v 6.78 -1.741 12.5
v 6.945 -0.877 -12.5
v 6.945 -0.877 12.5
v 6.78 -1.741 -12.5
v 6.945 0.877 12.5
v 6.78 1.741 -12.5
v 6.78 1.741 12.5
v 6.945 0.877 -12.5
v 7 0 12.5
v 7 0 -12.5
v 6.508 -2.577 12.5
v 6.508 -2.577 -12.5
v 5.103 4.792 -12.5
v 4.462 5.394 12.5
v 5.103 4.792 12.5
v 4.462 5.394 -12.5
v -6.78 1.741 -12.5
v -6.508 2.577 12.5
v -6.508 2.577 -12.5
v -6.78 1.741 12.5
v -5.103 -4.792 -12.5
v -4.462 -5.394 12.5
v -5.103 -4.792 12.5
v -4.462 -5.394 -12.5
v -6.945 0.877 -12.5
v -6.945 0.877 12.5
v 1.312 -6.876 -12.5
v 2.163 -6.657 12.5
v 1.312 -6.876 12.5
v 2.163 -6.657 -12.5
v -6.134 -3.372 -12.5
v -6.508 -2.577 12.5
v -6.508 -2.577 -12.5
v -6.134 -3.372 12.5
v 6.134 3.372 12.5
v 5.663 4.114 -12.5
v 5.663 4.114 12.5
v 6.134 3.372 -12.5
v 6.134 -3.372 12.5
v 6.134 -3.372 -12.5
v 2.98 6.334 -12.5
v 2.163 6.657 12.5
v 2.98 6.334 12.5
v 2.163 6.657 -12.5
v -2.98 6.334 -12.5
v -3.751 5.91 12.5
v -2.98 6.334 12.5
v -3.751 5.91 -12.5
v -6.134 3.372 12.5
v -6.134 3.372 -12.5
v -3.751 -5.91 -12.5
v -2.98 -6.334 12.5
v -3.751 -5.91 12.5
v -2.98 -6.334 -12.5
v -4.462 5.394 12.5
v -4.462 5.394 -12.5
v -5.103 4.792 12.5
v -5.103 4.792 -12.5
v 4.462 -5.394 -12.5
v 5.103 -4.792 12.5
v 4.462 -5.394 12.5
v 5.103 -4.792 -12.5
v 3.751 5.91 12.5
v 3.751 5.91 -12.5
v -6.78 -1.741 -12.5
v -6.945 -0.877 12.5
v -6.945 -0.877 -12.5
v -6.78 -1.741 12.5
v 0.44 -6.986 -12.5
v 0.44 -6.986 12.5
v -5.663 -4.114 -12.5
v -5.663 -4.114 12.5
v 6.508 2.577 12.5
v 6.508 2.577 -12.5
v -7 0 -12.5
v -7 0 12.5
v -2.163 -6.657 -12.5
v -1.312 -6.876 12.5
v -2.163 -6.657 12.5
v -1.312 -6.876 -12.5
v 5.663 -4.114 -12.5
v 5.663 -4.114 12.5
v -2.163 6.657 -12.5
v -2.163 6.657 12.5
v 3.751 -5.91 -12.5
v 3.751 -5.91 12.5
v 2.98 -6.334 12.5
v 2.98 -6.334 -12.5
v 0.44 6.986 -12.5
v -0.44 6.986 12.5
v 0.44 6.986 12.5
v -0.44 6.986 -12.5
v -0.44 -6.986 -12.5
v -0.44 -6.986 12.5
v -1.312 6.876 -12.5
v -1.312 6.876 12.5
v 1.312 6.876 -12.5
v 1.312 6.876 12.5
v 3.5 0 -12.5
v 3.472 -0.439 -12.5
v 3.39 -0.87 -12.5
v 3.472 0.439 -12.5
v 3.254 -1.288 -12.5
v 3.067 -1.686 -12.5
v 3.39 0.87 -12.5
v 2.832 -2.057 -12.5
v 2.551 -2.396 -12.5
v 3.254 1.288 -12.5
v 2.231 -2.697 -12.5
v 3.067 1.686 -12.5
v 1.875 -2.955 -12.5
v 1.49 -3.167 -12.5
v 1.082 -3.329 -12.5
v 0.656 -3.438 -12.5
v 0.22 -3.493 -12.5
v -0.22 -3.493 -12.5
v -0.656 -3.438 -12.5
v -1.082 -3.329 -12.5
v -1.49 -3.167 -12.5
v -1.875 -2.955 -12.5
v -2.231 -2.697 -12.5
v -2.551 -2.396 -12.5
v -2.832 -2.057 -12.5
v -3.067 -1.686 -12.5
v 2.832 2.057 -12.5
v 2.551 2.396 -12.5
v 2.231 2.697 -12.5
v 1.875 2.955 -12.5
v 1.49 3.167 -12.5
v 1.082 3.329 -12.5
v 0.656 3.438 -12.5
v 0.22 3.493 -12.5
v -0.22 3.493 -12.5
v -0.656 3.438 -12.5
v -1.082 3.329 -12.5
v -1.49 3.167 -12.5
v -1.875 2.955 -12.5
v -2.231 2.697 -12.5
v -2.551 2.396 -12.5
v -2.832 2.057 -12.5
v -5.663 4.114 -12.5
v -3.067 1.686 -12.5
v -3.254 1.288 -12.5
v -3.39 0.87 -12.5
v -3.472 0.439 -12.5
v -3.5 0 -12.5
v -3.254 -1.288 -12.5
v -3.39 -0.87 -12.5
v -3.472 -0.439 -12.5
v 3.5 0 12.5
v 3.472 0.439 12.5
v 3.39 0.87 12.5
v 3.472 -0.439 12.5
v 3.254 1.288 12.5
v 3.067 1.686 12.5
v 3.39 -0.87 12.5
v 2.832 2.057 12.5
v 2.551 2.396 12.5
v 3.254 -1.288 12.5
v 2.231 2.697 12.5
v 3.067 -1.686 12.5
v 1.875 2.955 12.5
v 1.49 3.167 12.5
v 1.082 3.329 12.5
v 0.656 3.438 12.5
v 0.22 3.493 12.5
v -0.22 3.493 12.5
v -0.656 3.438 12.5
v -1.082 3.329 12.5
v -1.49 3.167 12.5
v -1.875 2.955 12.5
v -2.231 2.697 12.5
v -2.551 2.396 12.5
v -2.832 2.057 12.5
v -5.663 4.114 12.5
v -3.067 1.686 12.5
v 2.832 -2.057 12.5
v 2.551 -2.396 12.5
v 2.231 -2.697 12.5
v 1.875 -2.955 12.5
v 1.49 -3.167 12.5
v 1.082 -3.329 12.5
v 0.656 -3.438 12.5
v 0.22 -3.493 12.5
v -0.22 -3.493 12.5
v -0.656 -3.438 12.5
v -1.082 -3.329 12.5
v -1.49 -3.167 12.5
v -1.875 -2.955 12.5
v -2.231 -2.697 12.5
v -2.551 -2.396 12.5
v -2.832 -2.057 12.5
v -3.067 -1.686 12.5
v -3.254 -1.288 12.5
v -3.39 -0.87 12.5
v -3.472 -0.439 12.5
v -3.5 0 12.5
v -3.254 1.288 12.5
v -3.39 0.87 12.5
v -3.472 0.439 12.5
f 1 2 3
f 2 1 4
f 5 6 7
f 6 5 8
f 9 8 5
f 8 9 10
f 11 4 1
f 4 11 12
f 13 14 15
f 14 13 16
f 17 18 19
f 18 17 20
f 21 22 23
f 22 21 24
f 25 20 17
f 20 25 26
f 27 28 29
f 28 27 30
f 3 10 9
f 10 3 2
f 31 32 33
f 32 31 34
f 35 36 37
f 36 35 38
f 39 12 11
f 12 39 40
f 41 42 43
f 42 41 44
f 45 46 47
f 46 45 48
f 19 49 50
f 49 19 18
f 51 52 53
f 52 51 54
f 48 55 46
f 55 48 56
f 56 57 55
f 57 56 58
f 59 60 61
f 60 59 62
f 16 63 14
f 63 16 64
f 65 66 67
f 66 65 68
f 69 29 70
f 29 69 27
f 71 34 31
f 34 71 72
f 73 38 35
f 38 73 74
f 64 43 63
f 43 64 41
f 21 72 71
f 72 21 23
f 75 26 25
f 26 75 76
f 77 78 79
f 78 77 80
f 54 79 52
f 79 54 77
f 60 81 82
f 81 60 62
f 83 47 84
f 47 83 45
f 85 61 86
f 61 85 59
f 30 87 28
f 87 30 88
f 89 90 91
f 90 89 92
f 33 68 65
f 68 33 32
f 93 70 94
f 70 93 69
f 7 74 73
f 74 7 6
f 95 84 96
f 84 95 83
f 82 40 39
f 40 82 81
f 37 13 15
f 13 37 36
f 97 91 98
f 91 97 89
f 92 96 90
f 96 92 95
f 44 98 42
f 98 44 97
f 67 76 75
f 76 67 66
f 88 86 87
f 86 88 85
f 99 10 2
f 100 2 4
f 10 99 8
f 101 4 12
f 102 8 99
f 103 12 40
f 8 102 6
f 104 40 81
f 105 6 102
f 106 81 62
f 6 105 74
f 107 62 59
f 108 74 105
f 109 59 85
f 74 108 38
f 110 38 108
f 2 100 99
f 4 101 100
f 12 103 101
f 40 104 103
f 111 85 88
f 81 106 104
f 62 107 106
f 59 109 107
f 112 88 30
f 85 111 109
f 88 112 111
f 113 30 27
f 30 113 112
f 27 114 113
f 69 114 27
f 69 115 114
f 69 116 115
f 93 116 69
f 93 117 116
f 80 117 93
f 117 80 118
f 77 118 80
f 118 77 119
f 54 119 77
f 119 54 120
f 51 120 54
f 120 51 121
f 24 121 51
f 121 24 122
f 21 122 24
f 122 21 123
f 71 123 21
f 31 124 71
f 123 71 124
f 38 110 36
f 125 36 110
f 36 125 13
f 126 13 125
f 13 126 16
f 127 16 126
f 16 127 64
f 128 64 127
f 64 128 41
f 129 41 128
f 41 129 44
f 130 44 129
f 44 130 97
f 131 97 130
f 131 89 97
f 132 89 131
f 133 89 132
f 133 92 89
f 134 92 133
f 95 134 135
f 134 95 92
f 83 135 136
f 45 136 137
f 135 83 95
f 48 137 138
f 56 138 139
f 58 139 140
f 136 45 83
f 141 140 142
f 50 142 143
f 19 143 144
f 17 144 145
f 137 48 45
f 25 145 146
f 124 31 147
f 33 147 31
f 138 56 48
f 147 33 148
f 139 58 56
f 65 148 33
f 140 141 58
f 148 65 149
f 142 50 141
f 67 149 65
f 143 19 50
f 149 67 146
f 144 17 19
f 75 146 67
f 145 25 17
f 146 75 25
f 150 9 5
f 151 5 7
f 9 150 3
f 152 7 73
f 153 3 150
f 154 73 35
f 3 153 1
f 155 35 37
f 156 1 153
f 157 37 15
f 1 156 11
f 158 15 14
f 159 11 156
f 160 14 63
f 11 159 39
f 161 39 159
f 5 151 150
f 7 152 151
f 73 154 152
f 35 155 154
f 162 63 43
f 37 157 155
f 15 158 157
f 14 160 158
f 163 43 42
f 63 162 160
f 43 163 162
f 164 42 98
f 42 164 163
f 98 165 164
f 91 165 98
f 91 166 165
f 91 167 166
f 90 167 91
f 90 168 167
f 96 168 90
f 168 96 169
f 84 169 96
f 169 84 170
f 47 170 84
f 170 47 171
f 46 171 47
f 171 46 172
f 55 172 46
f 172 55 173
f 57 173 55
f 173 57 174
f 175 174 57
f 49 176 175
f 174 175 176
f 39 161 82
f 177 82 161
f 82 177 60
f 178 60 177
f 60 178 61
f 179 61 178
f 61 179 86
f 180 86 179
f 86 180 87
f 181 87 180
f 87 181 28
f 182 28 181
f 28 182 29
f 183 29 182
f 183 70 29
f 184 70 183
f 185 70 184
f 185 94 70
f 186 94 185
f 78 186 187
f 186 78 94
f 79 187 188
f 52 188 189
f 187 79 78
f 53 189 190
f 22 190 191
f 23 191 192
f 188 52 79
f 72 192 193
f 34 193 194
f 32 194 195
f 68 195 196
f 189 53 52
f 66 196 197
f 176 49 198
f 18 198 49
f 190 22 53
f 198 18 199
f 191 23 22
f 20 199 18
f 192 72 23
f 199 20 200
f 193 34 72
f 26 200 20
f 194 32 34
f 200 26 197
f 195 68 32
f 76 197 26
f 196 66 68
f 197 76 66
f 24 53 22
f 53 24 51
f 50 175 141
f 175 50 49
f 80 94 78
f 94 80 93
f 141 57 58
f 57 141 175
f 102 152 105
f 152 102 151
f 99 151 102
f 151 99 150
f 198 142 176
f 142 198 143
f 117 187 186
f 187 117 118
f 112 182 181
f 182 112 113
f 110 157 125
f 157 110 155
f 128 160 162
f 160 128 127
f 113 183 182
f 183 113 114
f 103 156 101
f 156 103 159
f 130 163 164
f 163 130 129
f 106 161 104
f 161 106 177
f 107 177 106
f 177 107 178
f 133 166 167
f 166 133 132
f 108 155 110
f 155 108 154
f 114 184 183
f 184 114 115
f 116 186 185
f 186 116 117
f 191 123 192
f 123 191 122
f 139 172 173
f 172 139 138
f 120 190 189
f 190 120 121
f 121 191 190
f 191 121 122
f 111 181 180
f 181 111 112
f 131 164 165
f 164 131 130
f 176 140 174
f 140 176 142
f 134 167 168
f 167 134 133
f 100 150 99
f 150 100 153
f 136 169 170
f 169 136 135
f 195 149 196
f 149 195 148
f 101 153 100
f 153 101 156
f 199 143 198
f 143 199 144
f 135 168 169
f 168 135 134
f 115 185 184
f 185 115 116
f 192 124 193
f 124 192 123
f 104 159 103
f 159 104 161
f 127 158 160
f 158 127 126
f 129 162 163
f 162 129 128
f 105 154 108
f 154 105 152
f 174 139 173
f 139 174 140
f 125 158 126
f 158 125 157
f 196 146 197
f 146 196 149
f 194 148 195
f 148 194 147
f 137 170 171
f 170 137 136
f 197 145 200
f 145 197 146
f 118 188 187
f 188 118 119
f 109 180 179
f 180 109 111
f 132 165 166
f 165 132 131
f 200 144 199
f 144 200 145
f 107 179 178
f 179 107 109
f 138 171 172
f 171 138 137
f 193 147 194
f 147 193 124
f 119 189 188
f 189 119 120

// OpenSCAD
$fn = 50;


difference() {
	union() {
		translate(v = [0, 0, -12.5000000000]) {
			cylinder(h = 25, r = 7.0000000000);
		}
	}
	union() {
		translate(v = [0, 0, -100.0000000000]) {
			cylinder(h = 200, r = 3.5000000000);
		}
	}
}
